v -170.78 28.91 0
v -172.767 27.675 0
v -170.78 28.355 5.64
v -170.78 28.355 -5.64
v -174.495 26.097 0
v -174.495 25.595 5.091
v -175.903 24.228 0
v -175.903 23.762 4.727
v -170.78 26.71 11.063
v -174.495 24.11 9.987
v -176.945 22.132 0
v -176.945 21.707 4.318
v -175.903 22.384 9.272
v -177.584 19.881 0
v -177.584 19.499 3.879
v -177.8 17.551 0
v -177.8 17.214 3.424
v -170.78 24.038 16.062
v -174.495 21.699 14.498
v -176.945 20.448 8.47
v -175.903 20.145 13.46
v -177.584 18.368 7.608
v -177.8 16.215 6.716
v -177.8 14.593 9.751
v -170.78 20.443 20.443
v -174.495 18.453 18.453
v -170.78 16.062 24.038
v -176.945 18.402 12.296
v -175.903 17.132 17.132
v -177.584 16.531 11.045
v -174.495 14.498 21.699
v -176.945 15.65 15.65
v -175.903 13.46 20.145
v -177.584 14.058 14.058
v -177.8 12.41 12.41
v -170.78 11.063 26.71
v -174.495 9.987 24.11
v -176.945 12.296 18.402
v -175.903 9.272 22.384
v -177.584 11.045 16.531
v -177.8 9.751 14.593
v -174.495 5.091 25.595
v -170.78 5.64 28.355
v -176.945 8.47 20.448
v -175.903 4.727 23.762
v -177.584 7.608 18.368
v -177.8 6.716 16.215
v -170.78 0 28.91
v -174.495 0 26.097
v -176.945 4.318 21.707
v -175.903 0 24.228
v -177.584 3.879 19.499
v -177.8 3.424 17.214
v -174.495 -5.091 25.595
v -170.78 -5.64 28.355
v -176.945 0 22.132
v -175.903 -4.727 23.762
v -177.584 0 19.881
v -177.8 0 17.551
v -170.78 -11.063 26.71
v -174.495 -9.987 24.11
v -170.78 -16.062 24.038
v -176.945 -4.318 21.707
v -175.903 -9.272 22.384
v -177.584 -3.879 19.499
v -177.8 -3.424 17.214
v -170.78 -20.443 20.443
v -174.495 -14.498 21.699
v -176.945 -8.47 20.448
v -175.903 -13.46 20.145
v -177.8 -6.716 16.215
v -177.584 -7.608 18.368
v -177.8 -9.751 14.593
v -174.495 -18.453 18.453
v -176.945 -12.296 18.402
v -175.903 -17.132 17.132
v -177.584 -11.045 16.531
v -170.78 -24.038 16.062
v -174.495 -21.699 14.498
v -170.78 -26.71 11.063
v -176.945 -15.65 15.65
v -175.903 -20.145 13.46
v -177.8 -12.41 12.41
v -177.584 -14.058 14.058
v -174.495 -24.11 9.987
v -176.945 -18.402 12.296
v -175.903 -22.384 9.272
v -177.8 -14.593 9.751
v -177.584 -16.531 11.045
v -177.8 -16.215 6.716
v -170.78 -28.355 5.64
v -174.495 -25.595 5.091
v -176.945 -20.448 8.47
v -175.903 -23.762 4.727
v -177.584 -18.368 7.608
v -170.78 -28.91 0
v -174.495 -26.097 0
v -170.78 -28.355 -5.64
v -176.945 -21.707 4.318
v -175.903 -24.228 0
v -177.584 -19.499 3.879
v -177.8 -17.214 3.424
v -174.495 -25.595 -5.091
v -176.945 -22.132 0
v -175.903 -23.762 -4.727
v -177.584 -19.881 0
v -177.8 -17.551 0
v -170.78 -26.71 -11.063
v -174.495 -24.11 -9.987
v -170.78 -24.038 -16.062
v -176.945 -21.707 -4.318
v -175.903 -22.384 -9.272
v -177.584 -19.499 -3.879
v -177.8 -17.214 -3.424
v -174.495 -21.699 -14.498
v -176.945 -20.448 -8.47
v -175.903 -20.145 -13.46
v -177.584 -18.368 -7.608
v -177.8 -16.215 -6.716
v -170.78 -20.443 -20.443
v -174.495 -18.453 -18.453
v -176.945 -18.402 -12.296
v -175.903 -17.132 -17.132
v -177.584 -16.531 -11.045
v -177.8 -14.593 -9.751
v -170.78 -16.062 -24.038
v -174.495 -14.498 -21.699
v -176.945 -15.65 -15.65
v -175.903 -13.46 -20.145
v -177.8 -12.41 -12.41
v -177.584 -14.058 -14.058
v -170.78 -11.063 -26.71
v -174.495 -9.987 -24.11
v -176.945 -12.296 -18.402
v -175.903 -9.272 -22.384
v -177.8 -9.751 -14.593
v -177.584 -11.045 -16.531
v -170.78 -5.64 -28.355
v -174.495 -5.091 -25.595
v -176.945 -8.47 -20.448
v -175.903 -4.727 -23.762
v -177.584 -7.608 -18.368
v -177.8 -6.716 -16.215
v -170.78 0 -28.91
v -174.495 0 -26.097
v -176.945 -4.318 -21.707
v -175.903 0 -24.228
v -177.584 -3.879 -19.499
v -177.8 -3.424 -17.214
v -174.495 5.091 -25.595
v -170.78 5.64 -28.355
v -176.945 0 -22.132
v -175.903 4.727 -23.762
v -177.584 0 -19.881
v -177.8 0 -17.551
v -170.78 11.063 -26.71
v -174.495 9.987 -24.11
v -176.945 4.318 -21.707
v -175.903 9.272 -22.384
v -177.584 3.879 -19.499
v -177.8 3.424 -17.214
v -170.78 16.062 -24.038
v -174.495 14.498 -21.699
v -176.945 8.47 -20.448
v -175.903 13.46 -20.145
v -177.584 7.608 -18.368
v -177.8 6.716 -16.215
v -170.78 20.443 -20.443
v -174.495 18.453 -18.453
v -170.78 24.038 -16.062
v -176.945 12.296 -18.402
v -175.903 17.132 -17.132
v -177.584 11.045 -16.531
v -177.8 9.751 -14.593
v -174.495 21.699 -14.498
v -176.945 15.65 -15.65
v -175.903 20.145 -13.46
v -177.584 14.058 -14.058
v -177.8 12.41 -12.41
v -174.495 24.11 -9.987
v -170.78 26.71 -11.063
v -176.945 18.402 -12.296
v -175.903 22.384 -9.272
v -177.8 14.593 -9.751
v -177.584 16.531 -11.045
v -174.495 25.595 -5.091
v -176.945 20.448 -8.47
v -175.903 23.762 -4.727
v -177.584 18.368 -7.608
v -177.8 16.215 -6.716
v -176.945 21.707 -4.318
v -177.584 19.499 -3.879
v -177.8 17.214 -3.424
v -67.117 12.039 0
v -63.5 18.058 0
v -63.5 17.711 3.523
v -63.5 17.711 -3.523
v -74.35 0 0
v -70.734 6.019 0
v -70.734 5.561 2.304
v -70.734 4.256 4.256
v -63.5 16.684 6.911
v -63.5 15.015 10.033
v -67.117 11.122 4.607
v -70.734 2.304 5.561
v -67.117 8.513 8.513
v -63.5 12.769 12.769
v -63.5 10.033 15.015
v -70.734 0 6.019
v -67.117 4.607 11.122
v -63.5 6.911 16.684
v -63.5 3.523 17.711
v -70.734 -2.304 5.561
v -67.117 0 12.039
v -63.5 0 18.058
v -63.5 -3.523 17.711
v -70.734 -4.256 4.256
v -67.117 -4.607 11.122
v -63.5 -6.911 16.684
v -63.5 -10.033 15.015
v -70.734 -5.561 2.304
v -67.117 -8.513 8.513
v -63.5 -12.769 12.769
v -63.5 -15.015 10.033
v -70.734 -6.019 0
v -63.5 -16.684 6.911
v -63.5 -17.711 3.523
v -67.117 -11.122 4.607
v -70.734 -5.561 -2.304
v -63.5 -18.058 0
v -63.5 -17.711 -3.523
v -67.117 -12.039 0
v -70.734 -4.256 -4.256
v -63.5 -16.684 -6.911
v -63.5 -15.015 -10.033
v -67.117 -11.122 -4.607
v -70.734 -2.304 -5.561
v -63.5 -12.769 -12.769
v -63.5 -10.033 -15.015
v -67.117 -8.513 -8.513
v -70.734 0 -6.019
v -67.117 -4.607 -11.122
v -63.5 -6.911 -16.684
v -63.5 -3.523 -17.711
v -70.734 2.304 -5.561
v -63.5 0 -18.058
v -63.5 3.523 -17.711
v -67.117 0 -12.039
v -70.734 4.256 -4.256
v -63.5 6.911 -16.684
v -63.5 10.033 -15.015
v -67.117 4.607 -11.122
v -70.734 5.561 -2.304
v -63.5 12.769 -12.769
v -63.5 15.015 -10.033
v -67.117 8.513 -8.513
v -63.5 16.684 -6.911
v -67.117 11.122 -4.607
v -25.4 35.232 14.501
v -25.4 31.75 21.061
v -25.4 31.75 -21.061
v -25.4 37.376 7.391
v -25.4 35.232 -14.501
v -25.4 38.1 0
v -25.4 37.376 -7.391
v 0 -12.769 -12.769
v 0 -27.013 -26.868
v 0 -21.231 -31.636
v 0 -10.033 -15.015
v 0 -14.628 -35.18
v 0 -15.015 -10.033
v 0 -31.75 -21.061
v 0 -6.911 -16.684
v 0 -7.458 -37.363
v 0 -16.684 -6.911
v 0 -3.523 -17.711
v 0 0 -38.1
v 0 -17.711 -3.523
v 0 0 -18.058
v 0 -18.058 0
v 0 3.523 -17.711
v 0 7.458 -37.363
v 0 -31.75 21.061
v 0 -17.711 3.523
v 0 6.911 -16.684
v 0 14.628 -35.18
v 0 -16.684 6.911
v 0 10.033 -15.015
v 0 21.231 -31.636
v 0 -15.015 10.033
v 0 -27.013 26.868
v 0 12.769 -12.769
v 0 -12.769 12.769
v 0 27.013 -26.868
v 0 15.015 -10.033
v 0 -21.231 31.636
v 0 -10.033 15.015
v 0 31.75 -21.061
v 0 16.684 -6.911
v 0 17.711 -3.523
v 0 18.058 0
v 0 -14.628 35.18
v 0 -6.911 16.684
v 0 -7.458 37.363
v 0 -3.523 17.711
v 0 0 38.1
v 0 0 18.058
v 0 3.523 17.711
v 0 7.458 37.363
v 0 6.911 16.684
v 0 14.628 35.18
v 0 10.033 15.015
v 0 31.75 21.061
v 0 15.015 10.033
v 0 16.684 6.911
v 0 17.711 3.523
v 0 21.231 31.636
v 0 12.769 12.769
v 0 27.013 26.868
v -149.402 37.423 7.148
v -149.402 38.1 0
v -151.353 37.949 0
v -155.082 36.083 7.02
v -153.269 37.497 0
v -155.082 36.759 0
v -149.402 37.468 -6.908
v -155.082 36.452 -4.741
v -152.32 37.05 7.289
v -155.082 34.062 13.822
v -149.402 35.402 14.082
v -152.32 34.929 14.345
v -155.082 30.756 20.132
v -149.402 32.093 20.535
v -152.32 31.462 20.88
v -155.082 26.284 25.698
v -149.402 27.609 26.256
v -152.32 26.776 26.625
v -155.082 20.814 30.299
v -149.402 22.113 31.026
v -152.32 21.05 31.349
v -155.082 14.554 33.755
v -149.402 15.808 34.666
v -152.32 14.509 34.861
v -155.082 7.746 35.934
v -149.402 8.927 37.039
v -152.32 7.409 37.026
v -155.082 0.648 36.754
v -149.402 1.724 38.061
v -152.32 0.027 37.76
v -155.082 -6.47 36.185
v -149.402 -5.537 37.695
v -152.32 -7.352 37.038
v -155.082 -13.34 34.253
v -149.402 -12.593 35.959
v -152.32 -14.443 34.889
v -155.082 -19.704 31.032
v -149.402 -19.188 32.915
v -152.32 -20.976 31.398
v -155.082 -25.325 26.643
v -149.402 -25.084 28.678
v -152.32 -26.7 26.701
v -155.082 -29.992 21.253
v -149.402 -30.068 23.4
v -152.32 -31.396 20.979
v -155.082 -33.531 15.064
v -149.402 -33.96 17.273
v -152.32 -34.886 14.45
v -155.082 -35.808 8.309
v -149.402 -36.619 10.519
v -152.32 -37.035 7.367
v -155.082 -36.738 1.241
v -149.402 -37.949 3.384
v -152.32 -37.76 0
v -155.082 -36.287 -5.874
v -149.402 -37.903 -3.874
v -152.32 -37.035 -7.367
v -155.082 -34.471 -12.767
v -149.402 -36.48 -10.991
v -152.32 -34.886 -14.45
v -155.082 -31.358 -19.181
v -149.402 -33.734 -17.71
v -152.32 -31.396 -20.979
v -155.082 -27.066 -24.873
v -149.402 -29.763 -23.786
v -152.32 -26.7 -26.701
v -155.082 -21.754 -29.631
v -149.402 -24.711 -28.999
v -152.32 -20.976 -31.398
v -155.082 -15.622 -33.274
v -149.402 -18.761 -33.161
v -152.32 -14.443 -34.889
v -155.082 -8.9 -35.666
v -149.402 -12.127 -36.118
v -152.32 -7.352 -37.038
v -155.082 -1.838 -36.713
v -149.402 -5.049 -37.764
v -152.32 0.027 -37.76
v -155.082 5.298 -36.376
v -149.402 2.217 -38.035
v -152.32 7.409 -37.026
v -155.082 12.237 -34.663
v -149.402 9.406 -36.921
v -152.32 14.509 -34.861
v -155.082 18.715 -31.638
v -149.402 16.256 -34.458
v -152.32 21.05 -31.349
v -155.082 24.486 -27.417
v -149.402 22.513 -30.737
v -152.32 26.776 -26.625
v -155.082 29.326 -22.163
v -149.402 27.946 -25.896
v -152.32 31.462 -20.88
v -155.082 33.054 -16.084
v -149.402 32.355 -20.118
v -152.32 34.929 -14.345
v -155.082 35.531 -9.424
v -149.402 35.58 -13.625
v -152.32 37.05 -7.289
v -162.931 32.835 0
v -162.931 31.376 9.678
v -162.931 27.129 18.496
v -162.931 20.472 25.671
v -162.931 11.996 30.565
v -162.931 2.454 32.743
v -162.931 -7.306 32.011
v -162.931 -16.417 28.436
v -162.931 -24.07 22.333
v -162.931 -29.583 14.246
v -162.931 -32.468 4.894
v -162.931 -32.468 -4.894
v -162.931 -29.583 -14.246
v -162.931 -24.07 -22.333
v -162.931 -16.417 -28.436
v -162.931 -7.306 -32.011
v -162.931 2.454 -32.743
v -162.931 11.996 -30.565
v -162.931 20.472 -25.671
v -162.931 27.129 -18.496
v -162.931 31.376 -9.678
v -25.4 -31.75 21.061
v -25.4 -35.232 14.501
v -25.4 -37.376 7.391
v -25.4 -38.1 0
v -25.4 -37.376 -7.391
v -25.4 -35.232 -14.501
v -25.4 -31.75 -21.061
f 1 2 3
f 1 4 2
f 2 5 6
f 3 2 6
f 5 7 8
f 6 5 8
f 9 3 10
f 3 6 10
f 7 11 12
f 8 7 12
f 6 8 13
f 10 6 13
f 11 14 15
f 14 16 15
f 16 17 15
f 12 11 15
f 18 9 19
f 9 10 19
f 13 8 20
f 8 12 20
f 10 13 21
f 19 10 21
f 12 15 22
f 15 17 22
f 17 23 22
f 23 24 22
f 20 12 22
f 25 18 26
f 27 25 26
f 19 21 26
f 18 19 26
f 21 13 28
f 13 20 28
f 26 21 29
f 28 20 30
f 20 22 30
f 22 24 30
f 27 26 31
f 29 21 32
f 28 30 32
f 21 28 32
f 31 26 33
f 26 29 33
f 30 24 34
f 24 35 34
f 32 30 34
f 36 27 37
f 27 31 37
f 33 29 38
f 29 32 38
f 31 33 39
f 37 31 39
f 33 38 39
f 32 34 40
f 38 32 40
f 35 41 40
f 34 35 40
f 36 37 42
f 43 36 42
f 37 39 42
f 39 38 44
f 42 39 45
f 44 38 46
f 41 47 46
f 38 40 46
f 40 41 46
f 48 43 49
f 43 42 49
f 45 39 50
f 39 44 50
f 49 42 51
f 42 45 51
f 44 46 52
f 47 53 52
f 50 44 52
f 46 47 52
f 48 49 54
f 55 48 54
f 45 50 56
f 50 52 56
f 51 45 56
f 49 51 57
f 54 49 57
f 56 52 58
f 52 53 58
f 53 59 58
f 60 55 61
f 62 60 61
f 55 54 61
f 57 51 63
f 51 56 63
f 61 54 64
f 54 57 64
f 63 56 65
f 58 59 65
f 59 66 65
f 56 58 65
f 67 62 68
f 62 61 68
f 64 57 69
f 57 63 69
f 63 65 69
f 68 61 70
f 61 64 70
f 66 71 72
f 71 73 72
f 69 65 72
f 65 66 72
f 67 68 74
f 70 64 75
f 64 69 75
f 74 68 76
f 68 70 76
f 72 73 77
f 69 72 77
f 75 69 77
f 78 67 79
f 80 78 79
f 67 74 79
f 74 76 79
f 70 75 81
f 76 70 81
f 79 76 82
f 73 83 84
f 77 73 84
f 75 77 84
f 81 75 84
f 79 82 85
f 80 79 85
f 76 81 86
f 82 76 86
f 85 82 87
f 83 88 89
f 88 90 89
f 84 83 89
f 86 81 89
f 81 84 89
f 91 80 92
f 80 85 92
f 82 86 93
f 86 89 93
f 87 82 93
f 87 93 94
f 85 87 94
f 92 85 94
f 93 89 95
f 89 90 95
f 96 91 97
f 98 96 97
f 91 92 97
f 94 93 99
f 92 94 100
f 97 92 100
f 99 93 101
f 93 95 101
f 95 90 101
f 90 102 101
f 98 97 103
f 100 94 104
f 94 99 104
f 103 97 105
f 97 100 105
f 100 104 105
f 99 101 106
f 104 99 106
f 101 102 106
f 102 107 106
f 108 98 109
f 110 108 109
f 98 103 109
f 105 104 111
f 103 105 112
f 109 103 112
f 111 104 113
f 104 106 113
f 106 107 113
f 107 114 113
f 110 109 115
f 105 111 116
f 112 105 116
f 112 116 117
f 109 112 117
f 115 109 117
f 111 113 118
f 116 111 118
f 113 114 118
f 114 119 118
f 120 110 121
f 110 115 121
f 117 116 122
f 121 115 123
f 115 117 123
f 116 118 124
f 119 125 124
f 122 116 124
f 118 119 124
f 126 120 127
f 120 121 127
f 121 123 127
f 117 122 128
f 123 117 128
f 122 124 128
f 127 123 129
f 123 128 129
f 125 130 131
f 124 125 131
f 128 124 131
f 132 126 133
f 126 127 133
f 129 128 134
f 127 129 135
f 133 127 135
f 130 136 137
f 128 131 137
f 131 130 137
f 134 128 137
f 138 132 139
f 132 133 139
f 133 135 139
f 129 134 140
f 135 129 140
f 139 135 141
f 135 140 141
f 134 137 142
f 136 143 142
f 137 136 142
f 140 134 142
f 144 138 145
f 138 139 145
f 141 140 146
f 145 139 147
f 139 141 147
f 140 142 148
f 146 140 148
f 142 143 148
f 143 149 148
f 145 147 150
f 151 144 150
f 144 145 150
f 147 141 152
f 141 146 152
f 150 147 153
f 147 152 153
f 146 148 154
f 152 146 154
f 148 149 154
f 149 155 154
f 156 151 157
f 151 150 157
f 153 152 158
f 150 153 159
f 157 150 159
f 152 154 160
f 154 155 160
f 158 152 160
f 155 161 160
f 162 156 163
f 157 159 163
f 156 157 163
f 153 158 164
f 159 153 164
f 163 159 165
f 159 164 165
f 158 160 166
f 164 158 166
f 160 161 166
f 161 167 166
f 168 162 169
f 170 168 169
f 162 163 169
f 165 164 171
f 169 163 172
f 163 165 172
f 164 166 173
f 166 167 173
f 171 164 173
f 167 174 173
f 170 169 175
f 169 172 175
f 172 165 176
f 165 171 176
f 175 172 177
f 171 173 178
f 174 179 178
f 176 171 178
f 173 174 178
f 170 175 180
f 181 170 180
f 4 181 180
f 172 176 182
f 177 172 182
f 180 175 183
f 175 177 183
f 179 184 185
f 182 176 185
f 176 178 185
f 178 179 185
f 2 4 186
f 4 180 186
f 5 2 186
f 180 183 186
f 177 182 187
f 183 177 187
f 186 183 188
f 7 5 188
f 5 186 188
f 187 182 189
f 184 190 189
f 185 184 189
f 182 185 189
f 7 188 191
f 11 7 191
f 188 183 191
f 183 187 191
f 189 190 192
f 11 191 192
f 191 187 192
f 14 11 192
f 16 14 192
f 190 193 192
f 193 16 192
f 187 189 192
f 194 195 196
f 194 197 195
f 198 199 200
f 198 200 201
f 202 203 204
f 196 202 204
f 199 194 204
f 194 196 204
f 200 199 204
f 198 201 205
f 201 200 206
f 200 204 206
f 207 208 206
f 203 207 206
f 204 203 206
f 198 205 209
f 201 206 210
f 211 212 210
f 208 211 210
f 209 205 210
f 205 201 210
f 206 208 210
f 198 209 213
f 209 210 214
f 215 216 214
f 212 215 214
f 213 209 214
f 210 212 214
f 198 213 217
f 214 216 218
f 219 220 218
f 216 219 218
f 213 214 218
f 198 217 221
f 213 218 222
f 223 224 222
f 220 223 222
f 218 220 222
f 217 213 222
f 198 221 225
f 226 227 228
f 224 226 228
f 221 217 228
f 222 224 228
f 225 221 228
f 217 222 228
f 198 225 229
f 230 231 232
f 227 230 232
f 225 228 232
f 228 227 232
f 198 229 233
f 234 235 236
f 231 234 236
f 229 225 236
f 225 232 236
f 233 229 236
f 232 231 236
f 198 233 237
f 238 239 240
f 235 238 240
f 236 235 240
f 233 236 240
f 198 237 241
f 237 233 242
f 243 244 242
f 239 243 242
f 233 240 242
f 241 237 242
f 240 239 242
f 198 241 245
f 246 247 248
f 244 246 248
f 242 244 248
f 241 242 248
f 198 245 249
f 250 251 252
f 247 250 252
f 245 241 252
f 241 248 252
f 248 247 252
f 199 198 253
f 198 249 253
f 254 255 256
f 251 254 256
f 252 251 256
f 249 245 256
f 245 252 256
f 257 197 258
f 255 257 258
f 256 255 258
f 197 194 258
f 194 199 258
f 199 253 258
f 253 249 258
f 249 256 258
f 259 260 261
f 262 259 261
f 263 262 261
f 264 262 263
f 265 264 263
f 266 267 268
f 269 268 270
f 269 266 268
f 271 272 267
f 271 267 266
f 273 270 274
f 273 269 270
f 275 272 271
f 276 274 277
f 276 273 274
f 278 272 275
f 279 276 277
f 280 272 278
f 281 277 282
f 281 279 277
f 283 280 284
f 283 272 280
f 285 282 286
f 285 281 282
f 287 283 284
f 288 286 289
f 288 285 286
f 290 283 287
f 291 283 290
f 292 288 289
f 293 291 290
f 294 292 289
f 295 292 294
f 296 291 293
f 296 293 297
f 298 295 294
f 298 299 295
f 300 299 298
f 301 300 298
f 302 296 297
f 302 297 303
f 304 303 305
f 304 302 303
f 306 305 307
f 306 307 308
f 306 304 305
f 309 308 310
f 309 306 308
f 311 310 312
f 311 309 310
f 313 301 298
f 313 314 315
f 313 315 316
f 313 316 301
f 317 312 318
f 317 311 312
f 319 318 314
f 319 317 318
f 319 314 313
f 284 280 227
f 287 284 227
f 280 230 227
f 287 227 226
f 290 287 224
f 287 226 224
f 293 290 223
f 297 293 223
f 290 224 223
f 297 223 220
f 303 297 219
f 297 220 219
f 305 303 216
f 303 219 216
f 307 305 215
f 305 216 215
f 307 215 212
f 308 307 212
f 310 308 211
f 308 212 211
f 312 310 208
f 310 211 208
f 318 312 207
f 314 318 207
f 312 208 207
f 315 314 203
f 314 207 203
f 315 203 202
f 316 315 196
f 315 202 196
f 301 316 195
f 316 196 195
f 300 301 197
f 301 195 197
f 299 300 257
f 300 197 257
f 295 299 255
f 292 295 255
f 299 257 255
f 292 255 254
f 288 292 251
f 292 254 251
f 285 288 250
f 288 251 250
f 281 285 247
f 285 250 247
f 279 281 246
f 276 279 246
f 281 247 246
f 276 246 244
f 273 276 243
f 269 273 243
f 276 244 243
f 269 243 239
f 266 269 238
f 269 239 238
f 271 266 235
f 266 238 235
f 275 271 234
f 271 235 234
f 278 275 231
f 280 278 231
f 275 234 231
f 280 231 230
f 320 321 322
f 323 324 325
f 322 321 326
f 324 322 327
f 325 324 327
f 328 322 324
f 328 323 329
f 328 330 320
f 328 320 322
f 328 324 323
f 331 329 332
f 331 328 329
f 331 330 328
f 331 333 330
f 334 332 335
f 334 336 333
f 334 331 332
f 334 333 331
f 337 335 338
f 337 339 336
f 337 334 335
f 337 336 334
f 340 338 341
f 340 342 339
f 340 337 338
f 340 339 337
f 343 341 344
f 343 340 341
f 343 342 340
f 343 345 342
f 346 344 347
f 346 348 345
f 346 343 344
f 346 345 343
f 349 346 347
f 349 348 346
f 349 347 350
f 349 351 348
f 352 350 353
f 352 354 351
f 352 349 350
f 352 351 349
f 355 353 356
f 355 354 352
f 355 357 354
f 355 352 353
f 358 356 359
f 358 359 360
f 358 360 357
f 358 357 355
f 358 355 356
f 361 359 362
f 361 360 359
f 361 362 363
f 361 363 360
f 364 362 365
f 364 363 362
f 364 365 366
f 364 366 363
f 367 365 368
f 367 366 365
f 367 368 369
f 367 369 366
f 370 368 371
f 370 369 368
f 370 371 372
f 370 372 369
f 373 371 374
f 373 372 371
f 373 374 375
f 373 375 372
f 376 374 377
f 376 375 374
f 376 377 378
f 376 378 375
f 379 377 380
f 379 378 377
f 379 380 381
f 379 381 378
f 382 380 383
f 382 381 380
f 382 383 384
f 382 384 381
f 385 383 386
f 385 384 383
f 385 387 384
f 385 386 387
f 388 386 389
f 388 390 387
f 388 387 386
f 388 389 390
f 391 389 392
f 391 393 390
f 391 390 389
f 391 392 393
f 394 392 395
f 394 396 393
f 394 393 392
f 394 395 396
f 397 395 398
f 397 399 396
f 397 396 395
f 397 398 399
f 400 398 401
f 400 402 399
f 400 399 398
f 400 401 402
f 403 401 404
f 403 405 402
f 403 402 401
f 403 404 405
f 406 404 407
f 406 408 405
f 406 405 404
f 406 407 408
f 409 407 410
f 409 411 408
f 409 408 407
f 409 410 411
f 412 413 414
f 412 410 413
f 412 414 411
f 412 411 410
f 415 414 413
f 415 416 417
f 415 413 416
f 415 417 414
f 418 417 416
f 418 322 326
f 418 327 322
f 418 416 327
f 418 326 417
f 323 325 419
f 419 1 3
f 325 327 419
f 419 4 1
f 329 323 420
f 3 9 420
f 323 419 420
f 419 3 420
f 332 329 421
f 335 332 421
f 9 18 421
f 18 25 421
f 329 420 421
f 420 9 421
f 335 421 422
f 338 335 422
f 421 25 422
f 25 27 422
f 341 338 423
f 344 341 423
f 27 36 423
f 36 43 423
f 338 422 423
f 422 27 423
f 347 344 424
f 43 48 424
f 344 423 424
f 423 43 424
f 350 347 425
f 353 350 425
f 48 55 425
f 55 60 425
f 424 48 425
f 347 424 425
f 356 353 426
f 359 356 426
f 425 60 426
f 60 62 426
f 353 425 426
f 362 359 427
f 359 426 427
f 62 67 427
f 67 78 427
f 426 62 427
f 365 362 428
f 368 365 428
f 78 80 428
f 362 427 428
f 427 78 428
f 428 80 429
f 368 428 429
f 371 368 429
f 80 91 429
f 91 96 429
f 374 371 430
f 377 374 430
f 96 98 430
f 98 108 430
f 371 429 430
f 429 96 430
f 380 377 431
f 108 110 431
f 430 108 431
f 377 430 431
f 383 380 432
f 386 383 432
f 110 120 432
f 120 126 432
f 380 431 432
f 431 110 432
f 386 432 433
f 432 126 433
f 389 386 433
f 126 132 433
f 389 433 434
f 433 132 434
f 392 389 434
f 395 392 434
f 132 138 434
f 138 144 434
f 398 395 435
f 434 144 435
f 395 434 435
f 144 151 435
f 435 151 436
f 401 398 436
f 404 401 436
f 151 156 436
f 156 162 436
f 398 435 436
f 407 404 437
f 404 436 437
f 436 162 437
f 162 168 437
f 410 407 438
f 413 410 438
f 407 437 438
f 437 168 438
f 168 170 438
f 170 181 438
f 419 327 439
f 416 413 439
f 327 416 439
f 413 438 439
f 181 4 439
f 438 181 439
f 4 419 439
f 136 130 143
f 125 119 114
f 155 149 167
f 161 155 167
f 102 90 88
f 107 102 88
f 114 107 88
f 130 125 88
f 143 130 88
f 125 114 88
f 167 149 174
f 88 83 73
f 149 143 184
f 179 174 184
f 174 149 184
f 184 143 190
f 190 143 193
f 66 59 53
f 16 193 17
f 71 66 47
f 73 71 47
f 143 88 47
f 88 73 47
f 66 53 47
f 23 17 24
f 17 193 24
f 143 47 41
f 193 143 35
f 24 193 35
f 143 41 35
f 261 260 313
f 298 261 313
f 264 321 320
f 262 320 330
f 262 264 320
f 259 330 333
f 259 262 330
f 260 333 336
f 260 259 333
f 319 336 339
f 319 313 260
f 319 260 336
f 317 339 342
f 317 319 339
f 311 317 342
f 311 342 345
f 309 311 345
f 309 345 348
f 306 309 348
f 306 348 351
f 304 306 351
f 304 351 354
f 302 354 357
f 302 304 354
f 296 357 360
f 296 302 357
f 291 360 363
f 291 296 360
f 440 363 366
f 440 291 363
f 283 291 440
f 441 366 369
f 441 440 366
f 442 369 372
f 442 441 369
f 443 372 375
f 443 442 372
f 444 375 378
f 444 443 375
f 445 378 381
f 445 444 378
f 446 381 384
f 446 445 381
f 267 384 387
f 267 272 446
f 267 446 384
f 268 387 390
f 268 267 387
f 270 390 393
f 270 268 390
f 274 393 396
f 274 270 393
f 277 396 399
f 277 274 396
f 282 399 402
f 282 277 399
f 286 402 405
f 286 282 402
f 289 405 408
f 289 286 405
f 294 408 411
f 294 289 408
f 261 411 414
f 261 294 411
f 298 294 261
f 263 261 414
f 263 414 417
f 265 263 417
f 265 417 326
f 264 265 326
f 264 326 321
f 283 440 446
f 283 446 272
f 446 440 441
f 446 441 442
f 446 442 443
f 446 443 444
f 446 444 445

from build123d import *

# Parameters (mm, degrees)
F0_R     = 38.1
F1_DEPTH = 177.8
F4_D     = 36.11626
F4_DEPTH = 63.5
F4_TIP   = 10.8504191703
F5_SIZE2 = 12.7
F5_SIZE  = 25.4
F6_R     = 12.7
F7_W     = 25.4
F7_H     = 6.35
F8_DEPTH = 50.8


with BuildPart() as f1:
    # F0 (on Right) → F1 (new body)
    with BuildSketch(Plane.YZ):
        Circle(F0_R)
    extrude(amount=-F1_DEPTH)

    # F4
    with Locations(Plane.YZ):
        with Locations((0, 0)):
            Hole(F4_D / 2, depth=F4_DEPTH)
            with Locations((0, 0, -(F4_DEPTH + F4_TIP / 2))):  # 118° drill point
                Cone(0, F4_D / 2, F4_TIP, mode=Mode.SUBTRACT)

    # F5
    f5_edges = [f1.edges().sort_by_distance(p)[0] for p in [
        (-177.8, -38.1, 0),
    ]]
    f5_side = f1.faces().sort_by_distance((-88.9, -38.1, 0))[0]
    chamfer(f5_edges, length=F5_SIZE, length2=F5_SIZE2, reference=f5_side)

    # F6
    f6_edges = [f1.edges().sort_by_distance(p)[0] for p in [
        (-177.8, -25.4, 0),
        (-152.4, -38.1, 0),
    ]]
    fillet(f6_edges, radius=F6_R)

    # F7 (on Top) → F8 (cut, symmetric)
    with BuildSketch(Plane.XY):
        with Locations((-12.7, 34.925)):
            Rectangle(F7_W, F7_H)
        with Locations((-12.7, -34.925)):
            Rectangle(F7_W, F7_H)
    extrude(amount=F8_DEPTH, both=True, mode=Mode.SUBTRACT)


solid = f1.part
